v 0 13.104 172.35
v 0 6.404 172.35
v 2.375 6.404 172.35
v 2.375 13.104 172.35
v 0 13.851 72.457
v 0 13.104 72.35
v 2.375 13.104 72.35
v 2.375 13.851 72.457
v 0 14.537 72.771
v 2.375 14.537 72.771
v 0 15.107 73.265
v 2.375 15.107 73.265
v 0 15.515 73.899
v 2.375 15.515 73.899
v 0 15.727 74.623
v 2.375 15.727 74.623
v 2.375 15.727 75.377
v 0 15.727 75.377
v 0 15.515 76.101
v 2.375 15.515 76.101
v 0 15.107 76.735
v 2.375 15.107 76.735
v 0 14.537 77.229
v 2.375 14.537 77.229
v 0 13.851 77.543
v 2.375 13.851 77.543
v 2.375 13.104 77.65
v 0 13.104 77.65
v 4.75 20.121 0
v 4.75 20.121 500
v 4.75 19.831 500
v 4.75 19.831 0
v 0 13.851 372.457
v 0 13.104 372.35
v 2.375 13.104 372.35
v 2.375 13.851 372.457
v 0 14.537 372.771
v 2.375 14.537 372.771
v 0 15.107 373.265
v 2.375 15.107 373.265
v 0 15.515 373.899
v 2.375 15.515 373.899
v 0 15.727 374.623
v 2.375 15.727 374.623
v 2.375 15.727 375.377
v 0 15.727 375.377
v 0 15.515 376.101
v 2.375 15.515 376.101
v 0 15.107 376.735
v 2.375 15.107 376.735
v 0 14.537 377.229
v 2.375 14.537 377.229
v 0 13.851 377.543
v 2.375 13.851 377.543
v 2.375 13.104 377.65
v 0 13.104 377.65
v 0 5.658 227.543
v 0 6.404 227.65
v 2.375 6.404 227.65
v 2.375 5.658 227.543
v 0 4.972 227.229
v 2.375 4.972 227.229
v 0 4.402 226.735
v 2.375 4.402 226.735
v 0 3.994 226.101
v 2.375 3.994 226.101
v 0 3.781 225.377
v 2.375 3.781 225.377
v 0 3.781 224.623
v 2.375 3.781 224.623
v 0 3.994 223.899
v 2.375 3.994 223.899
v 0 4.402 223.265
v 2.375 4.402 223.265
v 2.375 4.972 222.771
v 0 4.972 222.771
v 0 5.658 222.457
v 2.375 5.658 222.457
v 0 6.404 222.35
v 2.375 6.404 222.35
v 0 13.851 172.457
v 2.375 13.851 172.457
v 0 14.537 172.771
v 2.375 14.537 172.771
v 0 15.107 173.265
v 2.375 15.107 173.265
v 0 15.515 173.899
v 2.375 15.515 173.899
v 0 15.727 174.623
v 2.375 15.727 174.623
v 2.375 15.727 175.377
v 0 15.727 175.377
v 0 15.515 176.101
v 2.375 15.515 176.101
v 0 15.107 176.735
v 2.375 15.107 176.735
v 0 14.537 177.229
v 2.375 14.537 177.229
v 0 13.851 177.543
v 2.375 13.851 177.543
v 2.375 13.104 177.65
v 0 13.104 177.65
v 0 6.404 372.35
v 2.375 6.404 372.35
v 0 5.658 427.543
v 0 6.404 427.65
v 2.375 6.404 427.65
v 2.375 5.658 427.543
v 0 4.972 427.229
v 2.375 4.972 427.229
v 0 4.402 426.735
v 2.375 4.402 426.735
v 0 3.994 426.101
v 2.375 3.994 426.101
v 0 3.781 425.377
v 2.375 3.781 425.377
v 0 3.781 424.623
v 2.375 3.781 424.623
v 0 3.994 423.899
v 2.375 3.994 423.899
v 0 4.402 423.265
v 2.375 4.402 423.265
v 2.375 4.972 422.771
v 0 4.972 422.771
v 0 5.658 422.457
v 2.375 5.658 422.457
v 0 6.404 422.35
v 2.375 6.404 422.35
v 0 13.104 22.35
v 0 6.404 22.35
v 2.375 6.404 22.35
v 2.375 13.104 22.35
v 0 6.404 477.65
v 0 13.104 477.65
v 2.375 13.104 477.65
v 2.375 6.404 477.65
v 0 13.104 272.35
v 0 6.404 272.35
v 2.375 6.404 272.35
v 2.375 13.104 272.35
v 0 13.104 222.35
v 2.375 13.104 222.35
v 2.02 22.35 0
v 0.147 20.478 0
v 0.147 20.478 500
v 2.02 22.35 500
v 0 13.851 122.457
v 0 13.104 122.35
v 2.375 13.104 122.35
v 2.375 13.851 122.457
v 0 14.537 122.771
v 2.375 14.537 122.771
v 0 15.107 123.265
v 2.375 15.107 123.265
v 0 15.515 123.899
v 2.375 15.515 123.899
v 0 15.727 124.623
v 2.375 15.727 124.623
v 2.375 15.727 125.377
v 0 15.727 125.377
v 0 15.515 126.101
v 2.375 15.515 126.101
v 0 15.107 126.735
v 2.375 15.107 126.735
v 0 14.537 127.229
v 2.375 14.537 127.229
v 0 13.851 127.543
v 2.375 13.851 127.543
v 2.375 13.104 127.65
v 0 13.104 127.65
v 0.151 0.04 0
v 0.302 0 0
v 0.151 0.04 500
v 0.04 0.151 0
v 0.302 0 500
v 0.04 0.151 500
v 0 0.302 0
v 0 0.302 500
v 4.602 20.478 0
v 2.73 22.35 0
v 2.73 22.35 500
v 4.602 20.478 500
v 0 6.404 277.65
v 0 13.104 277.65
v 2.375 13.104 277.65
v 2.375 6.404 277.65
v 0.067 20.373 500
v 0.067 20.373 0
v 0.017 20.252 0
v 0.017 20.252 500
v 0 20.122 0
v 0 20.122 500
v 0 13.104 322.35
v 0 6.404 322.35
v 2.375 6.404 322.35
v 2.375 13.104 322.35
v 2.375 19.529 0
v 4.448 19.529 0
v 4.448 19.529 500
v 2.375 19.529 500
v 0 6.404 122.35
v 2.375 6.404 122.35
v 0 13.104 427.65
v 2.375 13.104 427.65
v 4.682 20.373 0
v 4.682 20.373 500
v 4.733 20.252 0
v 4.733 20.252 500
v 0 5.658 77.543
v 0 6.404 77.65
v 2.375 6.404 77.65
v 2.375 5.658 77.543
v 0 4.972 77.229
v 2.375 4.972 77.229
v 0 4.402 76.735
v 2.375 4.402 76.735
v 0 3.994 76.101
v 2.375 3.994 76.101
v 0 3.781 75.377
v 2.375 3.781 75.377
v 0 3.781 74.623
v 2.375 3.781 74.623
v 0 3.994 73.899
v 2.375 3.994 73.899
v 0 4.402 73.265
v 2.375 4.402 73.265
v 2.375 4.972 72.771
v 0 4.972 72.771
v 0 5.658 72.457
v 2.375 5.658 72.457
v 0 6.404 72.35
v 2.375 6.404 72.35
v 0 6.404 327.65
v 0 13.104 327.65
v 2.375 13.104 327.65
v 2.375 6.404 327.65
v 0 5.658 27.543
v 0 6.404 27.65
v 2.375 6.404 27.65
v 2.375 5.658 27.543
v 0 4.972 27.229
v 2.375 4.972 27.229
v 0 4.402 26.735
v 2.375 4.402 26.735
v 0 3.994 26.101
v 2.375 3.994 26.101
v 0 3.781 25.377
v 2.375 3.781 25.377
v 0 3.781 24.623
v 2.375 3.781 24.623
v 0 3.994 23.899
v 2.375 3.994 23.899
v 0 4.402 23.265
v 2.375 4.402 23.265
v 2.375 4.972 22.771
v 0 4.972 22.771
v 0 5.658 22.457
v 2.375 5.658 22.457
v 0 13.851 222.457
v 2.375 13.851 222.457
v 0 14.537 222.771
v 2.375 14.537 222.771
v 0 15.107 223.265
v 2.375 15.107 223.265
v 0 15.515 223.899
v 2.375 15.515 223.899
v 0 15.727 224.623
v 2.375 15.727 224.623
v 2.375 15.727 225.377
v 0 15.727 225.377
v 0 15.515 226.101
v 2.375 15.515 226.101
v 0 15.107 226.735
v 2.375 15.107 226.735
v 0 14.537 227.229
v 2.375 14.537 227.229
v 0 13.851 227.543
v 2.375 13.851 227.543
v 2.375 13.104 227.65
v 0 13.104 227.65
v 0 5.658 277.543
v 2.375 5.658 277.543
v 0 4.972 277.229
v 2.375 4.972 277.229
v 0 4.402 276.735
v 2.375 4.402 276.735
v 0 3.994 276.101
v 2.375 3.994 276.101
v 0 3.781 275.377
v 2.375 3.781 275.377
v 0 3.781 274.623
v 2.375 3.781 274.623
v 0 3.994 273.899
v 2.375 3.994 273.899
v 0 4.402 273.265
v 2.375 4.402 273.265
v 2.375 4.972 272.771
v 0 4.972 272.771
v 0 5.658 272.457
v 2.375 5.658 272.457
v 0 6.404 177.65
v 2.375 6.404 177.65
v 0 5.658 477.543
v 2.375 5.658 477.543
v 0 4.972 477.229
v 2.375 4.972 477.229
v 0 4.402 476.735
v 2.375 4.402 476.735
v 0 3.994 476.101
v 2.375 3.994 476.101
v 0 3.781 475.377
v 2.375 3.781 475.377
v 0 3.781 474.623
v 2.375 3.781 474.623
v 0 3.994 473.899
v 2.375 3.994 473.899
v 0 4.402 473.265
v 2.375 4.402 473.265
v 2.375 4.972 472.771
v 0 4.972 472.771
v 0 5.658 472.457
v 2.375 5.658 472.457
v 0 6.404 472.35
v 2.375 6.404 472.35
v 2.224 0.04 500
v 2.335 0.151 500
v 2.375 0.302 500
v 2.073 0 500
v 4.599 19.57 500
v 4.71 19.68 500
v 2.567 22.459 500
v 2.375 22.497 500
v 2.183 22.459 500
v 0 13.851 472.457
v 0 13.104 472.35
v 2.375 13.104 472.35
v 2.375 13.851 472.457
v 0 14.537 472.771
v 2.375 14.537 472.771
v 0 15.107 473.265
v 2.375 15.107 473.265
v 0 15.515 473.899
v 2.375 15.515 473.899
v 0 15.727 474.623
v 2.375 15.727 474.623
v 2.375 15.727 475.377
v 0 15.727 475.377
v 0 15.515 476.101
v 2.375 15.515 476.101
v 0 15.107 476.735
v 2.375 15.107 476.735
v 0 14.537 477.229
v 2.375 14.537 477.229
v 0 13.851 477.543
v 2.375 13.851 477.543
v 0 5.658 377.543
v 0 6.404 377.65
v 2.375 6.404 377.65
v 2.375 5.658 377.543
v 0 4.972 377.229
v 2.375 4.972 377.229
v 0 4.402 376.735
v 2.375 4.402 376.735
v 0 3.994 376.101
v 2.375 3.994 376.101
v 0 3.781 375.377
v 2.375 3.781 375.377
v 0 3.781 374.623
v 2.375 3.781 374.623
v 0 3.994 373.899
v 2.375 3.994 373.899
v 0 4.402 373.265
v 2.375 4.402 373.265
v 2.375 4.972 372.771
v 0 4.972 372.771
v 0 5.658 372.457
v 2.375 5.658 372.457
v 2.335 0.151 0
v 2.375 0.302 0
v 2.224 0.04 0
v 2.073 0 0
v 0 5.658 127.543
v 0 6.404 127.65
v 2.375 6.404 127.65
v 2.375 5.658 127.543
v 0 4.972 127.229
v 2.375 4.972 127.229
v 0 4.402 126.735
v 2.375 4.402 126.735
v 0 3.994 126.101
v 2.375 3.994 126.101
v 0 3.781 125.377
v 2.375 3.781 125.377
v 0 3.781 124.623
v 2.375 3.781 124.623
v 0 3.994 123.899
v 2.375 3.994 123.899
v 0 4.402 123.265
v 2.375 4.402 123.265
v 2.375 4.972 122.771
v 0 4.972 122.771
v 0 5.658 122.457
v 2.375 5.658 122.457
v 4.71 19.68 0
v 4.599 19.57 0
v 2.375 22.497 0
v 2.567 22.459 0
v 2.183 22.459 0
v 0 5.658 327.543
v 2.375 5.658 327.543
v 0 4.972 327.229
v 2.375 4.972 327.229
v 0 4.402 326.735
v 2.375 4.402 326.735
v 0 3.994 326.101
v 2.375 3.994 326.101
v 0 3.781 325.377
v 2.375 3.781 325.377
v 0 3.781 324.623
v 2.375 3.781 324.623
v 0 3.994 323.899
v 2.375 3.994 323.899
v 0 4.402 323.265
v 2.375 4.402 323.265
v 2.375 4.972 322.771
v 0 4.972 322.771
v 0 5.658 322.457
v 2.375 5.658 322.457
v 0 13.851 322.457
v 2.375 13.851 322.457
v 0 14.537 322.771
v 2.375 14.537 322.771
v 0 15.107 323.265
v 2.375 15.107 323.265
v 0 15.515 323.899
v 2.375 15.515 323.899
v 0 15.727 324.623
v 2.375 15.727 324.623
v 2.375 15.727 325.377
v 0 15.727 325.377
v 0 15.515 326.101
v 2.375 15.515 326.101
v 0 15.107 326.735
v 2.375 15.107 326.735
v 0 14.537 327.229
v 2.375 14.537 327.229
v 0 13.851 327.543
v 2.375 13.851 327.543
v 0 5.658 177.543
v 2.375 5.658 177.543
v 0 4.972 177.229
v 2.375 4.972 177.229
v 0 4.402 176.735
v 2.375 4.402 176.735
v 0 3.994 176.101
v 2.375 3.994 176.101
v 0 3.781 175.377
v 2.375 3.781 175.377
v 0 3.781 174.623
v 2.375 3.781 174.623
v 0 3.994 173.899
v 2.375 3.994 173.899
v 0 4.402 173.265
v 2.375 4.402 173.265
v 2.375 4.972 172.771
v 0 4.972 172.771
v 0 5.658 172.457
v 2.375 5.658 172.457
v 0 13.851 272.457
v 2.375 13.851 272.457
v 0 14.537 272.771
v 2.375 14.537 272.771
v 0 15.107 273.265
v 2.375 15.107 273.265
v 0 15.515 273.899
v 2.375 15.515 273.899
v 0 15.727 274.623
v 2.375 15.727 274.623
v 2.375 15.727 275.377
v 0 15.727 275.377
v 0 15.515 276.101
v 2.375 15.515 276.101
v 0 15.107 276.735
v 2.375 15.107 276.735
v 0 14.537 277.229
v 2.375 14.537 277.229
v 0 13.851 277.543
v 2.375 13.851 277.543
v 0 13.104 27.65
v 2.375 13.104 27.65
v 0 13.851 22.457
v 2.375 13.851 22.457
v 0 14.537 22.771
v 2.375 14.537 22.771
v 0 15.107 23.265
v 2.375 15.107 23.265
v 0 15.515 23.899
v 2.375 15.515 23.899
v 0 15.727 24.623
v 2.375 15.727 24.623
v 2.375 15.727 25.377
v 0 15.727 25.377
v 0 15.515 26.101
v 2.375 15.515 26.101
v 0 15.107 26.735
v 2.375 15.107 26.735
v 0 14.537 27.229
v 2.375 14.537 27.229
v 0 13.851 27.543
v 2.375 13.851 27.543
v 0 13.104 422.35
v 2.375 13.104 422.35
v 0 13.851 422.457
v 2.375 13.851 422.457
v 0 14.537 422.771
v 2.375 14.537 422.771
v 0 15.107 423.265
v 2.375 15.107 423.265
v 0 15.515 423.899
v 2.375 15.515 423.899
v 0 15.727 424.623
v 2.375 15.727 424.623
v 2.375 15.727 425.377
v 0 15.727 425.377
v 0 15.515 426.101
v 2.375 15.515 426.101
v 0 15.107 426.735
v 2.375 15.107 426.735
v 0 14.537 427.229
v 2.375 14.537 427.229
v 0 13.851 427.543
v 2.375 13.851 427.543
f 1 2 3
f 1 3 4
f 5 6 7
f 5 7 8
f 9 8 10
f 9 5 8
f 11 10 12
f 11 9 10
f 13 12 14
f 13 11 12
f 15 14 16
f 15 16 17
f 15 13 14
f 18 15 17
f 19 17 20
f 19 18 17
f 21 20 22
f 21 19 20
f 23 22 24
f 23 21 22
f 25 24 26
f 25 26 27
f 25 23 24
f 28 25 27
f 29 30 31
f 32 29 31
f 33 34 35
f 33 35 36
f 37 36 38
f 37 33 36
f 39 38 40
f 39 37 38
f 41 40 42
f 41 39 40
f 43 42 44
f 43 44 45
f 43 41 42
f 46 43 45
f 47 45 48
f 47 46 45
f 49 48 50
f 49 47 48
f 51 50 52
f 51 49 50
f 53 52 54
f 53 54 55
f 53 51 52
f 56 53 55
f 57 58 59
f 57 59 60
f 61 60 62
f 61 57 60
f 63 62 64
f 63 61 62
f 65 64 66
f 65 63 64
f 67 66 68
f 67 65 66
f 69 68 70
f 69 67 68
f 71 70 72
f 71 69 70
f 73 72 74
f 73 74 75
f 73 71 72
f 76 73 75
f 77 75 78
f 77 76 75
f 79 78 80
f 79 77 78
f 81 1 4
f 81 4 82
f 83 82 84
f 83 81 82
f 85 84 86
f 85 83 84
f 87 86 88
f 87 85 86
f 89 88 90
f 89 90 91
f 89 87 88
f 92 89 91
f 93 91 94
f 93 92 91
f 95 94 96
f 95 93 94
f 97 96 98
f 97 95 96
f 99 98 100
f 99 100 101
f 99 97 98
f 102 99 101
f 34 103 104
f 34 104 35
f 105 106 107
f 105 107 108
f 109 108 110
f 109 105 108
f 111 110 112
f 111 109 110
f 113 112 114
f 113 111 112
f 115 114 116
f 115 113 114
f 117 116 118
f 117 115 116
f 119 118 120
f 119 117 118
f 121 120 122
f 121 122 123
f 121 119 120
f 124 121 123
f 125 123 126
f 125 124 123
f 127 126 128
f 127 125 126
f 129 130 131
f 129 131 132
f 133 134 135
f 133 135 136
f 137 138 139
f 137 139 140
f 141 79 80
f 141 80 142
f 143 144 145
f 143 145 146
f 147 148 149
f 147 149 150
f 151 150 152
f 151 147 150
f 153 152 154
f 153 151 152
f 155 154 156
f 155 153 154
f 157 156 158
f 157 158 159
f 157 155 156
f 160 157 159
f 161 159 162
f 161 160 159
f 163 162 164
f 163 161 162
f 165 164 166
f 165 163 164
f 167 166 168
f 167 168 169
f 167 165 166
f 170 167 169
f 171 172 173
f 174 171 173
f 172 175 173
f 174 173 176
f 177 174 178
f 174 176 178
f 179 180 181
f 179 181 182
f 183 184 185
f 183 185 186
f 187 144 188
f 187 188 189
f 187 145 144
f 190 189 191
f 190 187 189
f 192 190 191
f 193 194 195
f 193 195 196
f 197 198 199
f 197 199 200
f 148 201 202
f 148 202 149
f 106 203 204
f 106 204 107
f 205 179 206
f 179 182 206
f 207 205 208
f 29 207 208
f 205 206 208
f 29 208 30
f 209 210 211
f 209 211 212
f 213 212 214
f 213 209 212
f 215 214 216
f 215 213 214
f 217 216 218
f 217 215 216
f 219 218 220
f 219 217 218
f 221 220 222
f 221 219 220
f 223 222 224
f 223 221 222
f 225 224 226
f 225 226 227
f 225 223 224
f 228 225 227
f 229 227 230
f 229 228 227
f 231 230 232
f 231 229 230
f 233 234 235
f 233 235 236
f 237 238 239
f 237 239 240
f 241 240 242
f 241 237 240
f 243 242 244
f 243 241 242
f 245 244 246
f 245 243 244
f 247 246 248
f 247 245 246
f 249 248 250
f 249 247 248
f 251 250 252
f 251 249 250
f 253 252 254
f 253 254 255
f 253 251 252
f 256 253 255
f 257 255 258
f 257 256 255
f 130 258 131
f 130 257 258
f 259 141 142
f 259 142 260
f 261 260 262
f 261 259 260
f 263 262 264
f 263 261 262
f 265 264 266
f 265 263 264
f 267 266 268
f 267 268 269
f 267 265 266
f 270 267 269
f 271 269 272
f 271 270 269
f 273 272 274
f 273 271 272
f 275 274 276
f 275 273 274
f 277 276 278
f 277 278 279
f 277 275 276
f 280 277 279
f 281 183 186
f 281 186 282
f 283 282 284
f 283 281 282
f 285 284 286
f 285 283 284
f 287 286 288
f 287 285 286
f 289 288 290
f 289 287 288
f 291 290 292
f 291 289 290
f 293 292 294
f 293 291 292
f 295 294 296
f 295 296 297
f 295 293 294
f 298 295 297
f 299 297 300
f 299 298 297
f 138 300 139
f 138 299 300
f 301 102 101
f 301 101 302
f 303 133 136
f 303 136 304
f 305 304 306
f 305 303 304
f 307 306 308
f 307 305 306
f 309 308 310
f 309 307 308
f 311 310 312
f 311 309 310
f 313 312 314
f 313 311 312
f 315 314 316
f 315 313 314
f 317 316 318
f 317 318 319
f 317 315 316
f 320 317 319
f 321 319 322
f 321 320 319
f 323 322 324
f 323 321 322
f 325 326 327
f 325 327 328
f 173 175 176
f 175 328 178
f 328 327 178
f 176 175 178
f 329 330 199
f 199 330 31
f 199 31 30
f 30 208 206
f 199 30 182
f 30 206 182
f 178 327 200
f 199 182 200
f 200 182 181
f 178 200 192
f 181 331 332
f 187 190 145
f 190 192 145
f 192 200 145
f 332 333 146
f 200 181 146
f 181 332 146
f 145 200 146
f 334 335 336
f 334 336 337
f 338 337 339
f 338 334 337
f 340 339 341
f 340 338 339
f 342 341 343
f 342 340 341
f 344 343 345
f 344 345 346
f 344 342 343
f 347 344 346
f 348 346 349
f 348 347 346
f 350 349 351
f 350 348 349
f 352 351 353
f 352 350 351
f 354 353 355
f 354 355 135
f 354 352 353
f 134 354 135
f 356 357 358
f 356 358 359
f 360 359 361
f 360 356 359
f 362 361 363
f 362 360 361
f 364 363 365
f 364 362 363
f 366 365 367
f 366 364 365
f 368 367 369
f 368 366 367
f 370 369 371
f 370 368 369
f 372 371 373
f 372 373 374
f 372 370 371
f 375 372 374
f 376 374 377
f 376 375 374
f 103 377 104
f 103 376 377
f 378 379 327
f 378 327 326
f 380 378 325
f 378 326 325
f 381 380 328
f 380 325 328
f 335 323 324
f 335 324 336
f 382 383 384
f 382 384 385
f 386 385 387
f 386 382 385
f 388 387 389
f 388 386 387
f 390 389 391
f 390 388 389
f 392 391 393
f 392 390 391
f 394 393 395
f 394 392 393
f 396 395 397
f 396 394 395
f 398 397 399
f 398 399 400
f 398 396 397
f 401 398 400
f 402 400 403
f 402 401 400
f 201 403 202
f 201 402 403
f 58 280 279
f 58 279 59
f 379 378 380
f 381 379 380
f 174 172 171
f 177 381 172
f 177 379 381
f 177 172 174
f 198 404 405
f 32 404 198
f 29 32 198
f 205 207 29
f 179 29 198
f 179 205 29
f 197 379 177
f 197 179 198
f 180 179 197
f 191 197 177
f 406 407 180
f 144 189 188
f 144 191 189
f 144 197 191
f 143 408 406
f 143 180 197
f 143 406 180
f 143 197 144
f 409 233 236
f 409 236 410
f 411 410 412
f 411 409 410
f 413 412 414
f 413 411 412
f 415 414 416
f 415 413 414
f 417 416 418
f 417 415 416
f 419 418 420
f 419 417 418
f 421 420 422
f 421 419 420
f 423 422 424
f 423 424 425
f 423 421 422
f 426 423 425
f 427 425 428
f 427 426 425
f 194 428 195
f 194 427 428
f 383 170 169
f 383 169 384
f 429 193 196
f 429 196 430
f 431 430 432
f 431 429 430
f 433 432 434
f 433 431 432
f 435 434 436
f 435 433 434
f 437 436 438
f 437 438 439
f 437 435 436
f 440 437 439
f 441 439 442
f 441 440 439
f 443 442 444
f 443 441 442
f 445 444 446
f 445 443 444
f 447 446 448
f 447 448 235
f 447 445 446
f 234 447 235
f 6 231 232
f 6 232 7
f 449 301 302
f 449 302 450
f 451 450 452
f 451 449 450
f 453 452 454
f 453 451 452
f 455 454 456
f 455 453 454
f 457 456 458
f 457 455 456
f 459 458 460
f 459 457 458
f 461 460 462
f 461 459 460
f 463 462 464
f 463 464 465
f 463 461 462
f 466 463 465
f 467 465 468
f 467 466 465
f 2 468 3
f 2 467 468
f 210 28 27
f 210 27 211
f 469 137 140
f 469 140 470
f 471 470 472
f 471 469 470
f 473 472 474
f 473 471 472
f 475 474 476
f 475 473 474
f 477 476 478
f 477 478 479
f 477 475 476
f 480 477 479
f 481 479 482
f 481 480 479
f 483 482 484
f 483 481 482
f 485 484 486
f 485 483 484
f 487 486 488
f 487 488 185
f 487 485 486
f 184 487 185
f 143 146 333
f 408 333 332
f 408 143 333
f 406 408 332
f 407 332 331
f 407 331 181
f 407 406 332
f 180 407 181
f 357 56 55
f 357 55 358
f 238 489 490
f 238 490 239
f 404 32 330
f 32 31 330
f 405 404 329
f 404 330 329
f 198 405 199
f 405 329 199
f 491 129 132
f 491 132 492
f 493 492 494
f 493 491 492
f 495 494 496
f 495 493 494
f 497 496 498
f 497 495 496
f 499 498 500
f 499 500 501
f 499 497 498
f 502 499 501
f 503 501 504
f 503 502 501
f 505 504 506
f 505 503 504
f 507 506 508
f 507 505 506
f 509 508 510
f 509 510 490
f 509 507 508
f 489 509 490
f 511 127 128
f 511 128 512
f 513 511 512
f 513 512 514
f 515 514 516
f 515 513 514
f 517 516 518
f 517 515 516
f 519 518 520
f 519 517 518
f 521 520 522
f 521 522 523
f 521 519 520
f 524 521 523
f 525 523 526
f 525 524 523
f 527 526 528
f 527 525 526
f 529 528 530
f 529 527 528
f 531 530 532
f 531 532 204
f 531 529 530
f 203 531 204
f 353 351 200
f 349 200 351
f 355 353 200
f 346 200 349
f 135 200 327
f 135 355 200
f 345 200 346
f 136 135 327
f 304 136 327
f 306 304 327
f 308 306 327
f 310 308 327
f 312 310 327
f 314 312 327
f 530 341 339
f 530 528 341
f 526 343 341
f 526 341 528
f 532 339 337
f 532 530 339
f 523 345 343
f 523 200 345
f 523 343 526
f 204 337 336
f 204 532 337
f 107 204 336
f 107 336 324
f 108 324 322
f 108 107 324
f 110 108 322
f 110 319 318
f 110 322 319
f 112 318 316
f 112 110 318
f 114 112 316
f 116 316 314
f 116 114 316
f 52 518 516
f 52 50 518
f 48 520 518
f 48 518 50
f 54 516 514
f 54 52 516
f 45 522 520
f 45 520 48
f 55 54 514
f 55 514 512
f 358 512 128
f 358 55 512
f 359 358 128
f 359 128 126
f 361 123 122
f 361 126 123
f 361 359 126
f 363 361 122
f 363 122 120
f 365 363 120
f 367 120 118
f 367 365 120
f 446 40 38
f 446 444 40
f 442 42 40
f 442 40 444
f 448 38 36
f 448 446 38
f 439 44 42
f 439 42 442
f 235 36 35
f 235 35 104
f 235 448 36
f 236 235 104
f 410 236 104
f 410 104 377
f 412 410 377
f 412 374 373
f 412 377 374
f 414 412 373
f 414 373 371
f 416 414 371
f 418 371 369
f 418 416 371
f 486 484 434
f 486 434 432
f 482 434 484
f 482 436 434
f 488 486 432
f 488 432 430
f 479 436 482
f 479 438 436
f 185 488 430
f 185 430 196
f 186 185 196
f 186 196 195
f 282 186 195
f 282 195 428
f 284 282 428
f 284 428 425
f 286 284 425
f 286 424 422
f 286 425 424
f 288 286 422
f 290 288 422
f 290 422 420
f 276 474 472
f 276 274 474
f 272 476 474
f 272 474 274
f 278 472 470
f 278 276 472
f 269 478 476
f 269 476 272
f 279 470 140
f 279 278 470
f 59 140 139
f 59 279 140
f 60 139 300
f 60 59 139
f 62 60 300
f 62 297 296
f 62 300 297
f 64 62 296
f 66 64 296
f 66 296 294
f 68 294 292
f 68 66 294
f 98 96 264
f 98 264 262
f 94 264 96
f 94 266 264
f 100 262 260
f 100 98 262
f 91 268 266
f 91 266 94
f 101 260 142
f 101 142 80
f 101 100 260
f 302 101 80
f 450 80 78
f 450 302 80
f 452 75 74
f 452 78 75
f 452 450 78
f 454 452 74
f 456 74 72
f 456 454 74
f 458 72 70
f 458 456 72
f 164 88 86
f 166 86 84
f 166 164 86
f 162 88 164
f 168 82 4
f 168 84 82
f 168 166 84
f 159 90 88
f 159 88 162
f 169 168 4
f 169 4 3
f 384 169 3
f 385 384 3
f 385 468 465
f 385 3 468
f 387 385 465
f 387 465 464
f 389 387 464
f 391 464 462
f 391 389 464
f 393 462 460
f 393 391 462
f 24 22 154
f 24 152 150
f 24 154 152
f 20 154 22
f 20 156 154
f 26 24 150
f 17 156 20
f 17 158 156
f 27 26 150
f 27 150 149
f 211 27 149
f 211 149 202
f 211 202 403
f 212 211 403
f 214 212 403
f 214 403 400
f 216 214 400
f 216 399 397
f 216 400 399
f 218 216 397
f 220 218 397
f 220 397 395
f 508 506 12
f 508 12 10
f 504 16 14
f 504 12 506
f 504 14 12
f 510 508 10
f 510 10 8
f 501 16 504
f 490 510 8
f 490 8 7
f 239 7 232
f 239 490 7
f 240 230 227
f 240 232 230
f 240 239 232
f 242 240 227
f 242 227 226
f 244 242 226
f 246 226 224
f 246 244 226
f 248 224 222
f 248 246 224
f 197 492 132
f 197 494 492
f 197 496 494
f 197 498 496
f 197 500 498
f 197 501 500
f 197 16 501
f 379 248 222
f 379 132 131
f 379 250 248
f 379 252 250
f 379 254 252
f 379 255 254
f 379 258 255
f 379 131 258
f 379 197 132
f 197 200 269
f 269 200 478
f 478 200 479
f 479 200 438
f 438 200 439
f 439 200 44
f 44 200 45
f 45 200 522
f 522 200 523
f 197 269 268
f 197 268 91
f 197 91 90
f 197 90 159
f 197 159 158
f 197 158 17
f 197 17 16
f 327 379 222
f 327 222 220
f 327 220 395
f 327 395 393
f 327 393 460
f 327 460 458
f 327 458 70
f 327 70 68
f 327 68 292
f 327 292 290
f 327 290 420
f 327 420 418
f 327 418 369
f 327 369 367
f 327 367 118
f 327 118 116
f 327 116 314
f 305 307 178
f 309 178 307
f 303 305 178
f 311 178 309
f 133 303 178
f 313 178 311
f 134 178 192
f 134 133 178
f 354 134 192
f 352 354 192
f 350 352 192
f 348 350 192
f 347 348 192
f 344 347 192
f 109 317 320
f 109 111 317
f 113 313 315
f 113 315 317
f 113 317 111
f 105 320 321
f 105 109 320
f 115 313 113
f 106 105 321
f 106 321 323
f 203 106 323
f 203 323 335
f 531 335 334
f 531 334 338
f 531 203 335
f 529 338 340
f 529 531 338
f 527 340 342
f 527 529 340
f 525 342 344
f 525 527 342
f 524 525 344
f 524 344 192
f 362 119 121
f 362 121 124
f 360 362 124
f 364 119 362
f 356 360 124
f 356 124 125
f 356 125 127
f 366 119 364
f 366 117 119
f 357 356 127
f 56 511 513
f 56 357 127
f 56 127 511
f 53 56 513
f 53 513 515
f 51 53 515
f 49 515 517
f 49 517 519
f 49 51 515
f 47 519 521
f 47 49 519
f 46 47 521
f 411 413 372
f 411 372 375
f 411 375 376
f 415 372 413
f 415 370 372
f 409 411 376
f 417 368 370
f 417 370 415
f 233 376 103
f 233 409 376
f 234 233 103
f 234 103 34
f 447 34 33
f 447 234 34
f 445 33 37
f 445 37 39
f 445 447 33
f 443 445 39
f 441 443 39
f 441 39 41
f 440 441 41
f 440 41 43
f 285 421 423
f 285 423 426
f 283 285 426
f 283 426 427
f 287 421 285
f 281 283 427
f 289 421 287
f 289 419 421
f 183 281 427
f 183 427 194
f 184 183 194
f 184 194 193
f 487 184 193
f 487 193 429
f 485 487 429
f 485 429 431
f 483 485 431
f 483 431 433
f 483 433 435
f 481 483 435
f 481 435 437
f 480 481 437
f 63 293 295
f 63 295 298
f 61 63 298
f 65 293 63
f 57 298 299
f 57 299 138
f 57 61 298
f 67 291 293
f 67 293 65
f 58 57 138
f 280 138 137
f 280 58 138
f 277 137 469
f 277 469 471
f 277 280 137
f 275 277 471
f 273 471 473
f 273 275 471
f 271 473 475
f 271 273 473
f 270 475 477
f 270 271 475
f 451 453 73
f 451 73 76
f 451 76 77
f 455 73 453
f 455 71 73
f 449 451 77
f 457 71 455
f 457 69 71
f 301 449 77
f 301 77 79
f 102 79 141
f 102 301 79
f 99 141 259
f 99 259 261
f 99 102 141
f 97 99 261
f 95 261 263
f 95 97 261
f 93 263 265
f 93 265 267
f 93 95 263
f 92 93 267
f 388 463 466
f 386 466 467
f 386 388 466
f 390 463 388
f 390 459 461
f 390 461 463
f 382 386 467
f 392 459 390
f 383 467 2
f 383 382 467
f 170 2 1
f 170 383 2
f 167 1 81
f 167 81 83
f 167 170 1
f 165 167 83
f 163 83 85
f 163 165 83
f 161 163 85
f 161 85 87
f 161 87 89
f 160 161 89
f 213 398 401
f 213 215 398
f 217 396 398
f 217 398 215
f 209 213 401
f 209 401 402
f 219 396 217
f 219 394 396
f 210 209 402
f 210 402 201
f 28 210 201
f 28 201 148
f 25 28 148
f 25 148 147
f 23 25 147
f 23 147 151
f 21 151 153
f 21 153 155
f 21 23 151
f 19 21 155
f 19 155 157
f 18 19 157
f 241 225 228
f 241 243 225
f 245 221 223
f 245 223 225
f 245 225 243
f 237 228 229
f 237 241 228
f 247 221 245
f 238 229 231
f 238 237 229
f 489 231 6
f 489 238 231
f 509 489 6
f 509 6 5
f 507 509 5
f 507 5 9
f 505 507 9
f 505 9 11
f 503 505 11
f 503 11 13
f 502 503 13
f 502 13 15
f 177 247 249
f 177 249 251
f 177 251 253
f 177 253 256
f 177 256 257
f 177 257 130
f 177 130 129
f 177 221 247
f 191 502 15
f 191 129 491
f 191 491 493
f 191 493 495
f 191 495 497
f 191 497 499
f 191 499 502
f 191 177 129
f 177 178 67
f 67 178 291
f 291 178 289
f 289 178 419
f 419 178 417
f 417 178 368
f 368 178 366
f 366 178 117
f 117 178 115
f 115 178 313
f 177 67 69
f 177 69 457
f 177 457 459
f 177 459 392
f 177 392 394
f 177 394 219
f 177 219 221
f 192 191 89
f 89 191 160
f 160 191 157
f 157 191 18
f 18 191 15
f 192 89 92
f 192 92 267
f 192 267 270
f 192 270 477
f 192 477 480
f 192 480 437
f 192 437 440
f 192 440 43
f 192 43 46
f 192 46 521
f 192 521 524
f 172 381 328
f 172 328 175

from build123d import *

# Parameters (mm, degrees)
BOSS_EXTRUDE1_DEPTH = 500
FILLET1_R           = 0.50329666
FILLET2_R           = 0.50398302
FILLET3_R           = 0.30157619
FILLET4_R           = 0.30157551
CUT_EXTRUDE1_DEPTH  = 2.375
LPATTERN1_COUNT     = 10
LPATTERN1_PITCH     = 50


with BuildPart() as part:
    # Sketch1 → Boss-Extrude1 (new body)
    with BuildSketch(Plane.XY):
        with BuildLine():
            Line((0, 20.330194912), (2.019589054, 22.349783966))
            ThreePointArc((2.019589054, 22.349783966), (2.375, 22.497), (2.730410946, 22.349783966))
            Line((2.730410946, 22.349783966), (4.75, 20.330194912))
            Line((4.75, 20.330194912), (4.75, 19.5291))
            Line((4.75, 19.5291), (2.375, 19.5291))
            Line((2.375, 19.5291), (2.375, 0))
            Line((2.375, 0), (0, 0))
            Line((0, 0), (0, 20.330194912))
        make_face()
    extrude(amount=BOSS_EXTRUDE1_DEPTH)

    # Fillet1
    fillet1_edges = [part.edges().sort_by_distance(p)[0] for p in [
        (0, 20.330194912, 250),
    ]]
    fillet(fillet1_edges, radius=FILLET1_R)

    # Fillet2
    fillet2_edges = [part.edges().sort_by_distance(p)[0] for p in [
        (4.75, 20.330194912, 250),
    ]]
    fillet(fillet2_edges, radius=FILLET2_R)

    # Fillet3
    fillet3_edges = [part.edges().sort_by_distance(p)[0] for p in [
        (4.75, 19.5291, 250),
    ]]
    fillet(fillet3_edges, radius=FILLET3_R)

    # Fillet4
    fillet4_edges = [part.edges().sort_by_distance(p)[0] for p in [
        (2.375, 0, 250),
        (0, 0, 250),
    ]]
    fillet(fillet4_edges, radius=FILLET4_R)

    # Sketch2 → Cut-Extrude1 (cut)
    with BuildSketch(Plane.ZY):
        with BuildLine():
            Line((27.65, 13.1043), (27.65, 6.4043))
            ThreePointArc((27.65, 6.4043), (25, 3.7543), (22.35, 6.4043))
            Line((22.35, 6.4043), (22.35, 13.1043))
            ThreePointArc((22.35, 13.1043), (25, 15.7543), (27.65, 13.1043))
        make_face()
    cut_extrude1 = extrude(amount=-CUT_EXTRUDE1_DEPTH, mode=Mode.SUBTRACT)

    # LPattern1: Cut-Extrude1 ×10
    with Locations(*[(0, 0, i * LPATTERN1_PITCH) for i in range(1, LPATTERN1_COUNT)]):
        add(cut_extrude1, mode=Mode.SUBTRACT)


solid = part.part
